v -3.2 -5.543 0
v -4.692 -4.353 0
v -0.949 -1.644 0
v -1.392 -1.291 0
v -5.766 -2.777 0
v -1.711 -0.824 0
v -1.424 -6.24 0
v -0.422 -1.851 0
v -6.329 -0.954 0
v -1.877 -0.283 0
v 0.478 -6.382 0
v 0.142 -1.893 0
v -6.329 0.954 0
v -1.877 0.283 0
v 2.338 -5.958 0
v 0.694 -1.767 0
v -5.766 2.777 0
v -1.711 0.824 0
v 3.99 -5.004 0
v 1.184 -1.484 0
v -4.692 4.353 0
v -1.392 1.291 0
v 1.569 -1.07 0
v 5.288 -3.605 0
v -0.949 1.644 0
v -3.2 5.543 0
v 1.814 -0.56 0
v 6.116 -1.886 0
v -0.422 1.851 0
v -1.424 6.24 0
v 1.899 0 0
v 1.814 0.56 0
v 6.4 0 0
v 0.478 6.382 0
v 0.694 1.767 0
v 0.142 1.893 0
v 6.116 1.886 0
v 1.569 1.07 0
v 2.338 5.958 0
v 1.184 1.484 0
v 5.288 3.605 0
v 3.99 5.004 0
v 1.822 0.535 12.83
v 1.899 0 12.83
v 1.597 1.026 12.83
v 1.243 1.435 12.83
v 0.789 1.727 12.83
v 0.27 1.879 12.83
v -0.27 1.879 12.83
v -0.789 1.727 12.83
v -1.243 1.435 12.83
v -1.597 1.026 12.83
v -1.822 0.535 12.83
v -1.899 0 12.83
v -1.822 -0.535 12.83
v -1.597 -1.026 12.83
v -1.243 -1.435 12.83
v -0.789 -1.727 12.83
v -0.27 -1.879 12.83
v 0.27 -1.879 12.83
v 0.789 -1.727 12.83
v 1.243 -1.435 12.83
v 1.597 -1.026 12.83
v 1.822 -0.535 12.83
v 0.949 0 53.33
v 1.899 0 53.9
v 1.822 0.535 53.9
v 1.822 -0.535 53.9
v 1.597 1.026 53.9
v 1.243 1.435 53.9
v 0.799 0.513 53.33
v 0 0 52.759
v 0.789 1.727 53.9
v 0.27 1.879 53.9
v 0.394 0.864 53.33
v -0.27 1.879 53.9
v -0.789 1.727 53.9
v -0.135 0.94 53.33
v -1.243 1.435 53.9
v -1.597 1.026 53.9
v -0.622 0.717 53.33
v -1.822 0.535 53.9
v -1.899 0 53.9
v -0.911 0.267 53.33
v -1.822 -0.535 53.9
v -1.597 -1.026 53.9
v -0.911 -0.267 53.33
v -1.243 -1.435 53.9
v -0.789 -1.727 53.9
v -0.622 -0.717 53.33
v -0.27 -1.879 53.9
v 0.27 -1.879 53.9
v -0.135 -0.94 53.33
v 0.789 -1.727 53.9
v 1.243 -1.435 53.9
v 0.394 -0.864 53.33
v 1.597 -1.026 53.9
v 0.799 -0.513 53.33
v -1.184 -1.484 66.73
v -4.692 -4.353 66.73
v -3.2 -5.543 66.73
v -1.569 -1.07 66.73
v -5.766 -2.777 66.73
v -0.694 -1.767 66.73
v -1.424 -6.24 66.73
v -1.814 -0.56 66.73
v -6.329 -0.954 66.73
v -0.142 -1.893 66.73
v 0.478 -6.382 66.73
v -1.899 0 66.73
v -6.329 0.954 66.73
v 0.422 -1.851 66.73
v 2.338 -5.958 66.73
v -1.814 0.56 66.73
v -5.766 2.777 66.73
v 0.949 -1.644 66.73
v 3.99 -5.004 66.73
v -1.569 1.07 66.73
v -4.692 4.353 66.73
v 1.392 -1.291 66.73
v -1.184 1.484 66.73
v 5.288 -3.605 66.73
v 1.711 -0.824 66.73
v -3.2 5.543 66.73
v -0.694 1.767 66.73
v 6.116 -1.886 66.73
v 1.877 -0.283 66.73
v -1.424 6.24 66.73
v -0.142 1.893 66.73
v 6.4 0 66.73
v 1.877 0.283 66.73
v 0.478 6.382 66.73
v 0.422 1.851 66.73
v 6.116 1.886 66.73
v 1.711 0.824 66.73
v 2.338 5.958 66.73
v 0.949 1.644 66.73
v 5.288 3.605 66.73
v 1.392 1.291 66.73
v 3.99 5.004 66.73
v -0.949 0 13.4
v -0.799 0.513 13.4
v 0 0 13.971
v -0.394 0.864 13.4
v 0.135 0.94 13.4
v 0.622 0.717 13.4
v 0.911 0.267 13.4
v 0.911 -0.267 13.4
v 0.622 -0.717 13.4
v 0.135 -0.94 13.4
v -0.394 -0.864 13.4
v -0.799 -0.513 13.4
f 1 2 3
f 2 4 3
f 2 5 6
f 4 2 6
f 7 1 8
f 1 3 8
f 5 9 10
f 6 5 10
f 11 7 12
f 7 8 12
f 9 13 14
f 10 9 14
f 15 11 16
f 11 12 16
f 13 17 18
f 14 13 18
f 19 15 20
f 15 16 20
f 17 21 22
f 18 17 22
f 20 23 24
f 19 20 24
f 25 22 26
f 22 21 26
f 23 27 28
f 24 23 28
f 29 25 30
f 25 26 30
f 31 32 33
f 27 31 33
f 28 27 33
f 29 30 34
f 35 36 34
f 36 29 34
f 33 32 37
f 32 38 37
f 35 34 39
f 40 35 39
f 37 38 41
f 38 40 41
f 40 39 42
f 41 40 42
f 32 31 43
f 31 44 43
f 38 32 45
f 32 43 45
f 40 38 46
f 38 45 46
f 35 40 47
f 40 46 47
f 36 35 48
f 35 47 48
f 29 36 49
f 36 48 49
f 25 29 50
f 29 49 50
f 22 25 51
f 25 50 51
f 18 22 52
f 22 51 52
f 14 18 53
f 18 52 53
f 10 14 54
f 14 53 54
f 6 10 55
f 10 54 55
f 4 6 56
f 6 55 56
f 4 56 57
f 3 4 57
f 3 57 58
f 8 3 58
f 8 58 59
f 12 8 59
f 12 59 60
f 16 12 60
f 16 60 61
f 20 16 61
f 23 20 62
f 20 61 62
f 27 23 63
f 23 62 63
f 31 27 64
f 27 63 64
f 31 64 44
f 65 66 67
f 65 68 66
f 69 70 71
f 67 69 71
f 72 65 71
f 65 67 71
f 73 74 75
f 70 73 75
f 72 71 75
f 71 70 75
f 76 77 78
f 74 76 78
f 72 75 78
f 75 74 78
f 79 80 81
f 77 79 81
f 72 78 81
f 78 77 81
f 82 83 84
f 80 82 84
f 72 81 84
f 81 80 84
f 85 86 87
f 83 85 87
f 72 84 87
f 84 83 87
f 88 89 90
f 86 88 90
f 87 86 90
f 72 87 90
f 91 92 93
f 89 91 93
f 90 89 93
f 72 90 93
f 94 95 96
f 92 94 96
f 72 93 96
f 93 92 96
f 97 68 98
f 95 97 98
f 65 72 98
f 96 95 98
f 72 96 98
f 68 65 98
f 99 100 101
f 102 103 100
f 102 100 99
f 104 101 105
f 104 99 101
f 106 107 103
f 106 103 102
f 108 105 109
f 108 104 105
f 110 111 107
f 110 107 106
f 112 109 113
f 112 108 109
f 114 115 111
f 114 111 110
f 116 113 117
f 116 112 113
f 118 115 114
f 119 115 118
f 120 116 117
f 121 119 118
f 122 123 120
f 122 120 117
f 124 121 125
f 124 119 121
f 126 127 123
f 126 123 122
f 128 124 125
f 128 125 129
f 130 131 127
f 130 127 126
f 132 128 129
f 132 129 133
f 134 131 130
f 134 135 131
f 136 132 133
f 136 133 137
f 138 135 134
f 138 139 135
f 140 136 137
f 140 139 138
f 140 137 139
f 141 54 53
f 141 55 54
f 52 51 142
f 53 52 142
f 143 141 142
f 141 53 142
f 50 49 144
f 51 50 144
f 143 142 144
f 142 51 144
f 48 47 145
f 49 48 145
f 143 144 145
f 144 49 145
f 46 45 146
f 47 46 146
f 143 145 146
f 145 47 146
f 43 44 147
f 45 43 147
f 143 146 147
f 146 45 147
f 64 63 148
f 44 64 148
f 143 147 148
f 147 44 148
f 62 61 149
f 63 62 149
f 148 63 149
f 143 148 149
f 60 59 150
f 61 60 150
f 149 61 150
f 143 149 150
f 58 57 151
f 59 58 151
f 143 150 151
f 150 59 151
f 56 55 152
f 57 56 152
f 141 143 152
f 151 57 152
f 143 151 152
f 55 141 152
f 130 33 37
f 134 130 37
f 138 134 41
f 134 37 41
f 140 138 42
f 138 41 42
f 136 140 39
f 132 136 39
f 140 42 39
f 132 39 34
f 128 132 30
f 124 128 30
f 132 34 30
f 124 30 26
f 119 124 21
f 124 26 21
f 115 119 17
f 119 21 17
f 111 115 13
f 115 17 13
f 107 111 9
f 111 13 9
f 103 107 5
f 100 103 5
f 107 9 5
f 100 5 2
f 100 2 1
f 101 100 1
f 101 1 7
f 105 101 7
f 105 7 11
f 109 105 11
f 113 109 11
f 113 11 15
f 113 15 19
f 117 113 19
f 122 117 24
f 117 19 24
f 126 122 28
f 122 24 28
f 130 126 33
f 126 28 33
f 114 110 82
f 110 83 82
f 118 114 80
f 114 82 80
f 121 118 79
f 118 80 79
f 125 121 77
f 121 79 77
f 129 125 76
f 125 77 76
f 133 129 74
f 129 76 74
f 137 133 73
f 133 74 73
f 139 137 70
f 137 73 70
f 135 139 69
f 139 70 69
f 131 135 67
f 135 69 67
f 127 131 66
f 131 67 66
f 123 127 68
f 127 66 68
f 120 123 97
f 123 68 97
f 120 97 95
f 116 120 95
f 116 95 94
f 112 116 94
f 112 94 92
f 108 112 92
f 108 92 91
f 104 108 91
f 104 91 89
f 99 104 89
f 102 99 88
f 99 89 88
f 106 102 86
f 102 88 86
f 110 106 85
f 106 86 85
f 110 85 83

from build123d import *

# Parameters (mm, degrees)
SKETCH1_R                  = 6.4
BOSS_EXTRUDE1_DEPTH        = 66.73
F_10_24_TAPPED_HOLE1_D     = 3.7973
F_10_24_TAPPED_HOLE1_DEPTH = 12.83
F_10_24_TAPPED_HOLE1_TIP   = 1.140824014
F_10_24_TAPPED_HOLE2_D     = 3.7973
F_10_24_TAPPED_HOLE2_DEPTH = 12.83
F_10_24_TAPPED_HOLE2_TIP   = 1.140824014


with BuildPart() as part:
    # Sketch1 → Boss-Extrude1 (new body)
    with BuildSketch(Plane.XY):
        Circle(SKETCH1_R)
    extrude(amount=BOSS_EXTRUDE1_DEPTH)

    # #10-24 Tapped Hole1
    with Locations(Plane(origin=(0, 0, 0), x_dir=(-1, 0, 0), z_dir=(0, 0, -1))):
        with Locations((0, 0)):
            Hole(F_10_24_TAPPED_HOLE1_D / 2, depth=F_10_24_TAPPED_HOLE1_DEPTH)
            with Locations((0, 0, -(F_10_24_TAPPED_HOLE1_DEPTH + F_10_24_TAPPED_HOLE1_TIP / 2))):  # 118° drill point
                Cone(0, F_10_24_TAPPED_HOLE1_D / 2, F_10_24_TAPPED_HOLE1_TIP, mode=Mode.SUBTRACT)

    # #10-24 Tapped Hole2
    with Locations(Plane.XY.offset(66.73)):
        with Locations((0, 0)):
            Hole(F_10_24_TAPPED_HOLE2_D / 2, depth=F_10_24_TAPPED_HOLE2_DEPTH)
            with Locations((0, 0, -(F_10_24_TAPPED_HOLE2_DEPTH + F_10_24_TAPPED_HOLE2_TIP / 2))):  # 118° drill point
                Cone(0, F_10_24_TAPPED_HOLE2_D / 2, F_10_24_TAPPED_HOLE2_TIP, mode=Mode.SUBTRACT)


solid = part.part
